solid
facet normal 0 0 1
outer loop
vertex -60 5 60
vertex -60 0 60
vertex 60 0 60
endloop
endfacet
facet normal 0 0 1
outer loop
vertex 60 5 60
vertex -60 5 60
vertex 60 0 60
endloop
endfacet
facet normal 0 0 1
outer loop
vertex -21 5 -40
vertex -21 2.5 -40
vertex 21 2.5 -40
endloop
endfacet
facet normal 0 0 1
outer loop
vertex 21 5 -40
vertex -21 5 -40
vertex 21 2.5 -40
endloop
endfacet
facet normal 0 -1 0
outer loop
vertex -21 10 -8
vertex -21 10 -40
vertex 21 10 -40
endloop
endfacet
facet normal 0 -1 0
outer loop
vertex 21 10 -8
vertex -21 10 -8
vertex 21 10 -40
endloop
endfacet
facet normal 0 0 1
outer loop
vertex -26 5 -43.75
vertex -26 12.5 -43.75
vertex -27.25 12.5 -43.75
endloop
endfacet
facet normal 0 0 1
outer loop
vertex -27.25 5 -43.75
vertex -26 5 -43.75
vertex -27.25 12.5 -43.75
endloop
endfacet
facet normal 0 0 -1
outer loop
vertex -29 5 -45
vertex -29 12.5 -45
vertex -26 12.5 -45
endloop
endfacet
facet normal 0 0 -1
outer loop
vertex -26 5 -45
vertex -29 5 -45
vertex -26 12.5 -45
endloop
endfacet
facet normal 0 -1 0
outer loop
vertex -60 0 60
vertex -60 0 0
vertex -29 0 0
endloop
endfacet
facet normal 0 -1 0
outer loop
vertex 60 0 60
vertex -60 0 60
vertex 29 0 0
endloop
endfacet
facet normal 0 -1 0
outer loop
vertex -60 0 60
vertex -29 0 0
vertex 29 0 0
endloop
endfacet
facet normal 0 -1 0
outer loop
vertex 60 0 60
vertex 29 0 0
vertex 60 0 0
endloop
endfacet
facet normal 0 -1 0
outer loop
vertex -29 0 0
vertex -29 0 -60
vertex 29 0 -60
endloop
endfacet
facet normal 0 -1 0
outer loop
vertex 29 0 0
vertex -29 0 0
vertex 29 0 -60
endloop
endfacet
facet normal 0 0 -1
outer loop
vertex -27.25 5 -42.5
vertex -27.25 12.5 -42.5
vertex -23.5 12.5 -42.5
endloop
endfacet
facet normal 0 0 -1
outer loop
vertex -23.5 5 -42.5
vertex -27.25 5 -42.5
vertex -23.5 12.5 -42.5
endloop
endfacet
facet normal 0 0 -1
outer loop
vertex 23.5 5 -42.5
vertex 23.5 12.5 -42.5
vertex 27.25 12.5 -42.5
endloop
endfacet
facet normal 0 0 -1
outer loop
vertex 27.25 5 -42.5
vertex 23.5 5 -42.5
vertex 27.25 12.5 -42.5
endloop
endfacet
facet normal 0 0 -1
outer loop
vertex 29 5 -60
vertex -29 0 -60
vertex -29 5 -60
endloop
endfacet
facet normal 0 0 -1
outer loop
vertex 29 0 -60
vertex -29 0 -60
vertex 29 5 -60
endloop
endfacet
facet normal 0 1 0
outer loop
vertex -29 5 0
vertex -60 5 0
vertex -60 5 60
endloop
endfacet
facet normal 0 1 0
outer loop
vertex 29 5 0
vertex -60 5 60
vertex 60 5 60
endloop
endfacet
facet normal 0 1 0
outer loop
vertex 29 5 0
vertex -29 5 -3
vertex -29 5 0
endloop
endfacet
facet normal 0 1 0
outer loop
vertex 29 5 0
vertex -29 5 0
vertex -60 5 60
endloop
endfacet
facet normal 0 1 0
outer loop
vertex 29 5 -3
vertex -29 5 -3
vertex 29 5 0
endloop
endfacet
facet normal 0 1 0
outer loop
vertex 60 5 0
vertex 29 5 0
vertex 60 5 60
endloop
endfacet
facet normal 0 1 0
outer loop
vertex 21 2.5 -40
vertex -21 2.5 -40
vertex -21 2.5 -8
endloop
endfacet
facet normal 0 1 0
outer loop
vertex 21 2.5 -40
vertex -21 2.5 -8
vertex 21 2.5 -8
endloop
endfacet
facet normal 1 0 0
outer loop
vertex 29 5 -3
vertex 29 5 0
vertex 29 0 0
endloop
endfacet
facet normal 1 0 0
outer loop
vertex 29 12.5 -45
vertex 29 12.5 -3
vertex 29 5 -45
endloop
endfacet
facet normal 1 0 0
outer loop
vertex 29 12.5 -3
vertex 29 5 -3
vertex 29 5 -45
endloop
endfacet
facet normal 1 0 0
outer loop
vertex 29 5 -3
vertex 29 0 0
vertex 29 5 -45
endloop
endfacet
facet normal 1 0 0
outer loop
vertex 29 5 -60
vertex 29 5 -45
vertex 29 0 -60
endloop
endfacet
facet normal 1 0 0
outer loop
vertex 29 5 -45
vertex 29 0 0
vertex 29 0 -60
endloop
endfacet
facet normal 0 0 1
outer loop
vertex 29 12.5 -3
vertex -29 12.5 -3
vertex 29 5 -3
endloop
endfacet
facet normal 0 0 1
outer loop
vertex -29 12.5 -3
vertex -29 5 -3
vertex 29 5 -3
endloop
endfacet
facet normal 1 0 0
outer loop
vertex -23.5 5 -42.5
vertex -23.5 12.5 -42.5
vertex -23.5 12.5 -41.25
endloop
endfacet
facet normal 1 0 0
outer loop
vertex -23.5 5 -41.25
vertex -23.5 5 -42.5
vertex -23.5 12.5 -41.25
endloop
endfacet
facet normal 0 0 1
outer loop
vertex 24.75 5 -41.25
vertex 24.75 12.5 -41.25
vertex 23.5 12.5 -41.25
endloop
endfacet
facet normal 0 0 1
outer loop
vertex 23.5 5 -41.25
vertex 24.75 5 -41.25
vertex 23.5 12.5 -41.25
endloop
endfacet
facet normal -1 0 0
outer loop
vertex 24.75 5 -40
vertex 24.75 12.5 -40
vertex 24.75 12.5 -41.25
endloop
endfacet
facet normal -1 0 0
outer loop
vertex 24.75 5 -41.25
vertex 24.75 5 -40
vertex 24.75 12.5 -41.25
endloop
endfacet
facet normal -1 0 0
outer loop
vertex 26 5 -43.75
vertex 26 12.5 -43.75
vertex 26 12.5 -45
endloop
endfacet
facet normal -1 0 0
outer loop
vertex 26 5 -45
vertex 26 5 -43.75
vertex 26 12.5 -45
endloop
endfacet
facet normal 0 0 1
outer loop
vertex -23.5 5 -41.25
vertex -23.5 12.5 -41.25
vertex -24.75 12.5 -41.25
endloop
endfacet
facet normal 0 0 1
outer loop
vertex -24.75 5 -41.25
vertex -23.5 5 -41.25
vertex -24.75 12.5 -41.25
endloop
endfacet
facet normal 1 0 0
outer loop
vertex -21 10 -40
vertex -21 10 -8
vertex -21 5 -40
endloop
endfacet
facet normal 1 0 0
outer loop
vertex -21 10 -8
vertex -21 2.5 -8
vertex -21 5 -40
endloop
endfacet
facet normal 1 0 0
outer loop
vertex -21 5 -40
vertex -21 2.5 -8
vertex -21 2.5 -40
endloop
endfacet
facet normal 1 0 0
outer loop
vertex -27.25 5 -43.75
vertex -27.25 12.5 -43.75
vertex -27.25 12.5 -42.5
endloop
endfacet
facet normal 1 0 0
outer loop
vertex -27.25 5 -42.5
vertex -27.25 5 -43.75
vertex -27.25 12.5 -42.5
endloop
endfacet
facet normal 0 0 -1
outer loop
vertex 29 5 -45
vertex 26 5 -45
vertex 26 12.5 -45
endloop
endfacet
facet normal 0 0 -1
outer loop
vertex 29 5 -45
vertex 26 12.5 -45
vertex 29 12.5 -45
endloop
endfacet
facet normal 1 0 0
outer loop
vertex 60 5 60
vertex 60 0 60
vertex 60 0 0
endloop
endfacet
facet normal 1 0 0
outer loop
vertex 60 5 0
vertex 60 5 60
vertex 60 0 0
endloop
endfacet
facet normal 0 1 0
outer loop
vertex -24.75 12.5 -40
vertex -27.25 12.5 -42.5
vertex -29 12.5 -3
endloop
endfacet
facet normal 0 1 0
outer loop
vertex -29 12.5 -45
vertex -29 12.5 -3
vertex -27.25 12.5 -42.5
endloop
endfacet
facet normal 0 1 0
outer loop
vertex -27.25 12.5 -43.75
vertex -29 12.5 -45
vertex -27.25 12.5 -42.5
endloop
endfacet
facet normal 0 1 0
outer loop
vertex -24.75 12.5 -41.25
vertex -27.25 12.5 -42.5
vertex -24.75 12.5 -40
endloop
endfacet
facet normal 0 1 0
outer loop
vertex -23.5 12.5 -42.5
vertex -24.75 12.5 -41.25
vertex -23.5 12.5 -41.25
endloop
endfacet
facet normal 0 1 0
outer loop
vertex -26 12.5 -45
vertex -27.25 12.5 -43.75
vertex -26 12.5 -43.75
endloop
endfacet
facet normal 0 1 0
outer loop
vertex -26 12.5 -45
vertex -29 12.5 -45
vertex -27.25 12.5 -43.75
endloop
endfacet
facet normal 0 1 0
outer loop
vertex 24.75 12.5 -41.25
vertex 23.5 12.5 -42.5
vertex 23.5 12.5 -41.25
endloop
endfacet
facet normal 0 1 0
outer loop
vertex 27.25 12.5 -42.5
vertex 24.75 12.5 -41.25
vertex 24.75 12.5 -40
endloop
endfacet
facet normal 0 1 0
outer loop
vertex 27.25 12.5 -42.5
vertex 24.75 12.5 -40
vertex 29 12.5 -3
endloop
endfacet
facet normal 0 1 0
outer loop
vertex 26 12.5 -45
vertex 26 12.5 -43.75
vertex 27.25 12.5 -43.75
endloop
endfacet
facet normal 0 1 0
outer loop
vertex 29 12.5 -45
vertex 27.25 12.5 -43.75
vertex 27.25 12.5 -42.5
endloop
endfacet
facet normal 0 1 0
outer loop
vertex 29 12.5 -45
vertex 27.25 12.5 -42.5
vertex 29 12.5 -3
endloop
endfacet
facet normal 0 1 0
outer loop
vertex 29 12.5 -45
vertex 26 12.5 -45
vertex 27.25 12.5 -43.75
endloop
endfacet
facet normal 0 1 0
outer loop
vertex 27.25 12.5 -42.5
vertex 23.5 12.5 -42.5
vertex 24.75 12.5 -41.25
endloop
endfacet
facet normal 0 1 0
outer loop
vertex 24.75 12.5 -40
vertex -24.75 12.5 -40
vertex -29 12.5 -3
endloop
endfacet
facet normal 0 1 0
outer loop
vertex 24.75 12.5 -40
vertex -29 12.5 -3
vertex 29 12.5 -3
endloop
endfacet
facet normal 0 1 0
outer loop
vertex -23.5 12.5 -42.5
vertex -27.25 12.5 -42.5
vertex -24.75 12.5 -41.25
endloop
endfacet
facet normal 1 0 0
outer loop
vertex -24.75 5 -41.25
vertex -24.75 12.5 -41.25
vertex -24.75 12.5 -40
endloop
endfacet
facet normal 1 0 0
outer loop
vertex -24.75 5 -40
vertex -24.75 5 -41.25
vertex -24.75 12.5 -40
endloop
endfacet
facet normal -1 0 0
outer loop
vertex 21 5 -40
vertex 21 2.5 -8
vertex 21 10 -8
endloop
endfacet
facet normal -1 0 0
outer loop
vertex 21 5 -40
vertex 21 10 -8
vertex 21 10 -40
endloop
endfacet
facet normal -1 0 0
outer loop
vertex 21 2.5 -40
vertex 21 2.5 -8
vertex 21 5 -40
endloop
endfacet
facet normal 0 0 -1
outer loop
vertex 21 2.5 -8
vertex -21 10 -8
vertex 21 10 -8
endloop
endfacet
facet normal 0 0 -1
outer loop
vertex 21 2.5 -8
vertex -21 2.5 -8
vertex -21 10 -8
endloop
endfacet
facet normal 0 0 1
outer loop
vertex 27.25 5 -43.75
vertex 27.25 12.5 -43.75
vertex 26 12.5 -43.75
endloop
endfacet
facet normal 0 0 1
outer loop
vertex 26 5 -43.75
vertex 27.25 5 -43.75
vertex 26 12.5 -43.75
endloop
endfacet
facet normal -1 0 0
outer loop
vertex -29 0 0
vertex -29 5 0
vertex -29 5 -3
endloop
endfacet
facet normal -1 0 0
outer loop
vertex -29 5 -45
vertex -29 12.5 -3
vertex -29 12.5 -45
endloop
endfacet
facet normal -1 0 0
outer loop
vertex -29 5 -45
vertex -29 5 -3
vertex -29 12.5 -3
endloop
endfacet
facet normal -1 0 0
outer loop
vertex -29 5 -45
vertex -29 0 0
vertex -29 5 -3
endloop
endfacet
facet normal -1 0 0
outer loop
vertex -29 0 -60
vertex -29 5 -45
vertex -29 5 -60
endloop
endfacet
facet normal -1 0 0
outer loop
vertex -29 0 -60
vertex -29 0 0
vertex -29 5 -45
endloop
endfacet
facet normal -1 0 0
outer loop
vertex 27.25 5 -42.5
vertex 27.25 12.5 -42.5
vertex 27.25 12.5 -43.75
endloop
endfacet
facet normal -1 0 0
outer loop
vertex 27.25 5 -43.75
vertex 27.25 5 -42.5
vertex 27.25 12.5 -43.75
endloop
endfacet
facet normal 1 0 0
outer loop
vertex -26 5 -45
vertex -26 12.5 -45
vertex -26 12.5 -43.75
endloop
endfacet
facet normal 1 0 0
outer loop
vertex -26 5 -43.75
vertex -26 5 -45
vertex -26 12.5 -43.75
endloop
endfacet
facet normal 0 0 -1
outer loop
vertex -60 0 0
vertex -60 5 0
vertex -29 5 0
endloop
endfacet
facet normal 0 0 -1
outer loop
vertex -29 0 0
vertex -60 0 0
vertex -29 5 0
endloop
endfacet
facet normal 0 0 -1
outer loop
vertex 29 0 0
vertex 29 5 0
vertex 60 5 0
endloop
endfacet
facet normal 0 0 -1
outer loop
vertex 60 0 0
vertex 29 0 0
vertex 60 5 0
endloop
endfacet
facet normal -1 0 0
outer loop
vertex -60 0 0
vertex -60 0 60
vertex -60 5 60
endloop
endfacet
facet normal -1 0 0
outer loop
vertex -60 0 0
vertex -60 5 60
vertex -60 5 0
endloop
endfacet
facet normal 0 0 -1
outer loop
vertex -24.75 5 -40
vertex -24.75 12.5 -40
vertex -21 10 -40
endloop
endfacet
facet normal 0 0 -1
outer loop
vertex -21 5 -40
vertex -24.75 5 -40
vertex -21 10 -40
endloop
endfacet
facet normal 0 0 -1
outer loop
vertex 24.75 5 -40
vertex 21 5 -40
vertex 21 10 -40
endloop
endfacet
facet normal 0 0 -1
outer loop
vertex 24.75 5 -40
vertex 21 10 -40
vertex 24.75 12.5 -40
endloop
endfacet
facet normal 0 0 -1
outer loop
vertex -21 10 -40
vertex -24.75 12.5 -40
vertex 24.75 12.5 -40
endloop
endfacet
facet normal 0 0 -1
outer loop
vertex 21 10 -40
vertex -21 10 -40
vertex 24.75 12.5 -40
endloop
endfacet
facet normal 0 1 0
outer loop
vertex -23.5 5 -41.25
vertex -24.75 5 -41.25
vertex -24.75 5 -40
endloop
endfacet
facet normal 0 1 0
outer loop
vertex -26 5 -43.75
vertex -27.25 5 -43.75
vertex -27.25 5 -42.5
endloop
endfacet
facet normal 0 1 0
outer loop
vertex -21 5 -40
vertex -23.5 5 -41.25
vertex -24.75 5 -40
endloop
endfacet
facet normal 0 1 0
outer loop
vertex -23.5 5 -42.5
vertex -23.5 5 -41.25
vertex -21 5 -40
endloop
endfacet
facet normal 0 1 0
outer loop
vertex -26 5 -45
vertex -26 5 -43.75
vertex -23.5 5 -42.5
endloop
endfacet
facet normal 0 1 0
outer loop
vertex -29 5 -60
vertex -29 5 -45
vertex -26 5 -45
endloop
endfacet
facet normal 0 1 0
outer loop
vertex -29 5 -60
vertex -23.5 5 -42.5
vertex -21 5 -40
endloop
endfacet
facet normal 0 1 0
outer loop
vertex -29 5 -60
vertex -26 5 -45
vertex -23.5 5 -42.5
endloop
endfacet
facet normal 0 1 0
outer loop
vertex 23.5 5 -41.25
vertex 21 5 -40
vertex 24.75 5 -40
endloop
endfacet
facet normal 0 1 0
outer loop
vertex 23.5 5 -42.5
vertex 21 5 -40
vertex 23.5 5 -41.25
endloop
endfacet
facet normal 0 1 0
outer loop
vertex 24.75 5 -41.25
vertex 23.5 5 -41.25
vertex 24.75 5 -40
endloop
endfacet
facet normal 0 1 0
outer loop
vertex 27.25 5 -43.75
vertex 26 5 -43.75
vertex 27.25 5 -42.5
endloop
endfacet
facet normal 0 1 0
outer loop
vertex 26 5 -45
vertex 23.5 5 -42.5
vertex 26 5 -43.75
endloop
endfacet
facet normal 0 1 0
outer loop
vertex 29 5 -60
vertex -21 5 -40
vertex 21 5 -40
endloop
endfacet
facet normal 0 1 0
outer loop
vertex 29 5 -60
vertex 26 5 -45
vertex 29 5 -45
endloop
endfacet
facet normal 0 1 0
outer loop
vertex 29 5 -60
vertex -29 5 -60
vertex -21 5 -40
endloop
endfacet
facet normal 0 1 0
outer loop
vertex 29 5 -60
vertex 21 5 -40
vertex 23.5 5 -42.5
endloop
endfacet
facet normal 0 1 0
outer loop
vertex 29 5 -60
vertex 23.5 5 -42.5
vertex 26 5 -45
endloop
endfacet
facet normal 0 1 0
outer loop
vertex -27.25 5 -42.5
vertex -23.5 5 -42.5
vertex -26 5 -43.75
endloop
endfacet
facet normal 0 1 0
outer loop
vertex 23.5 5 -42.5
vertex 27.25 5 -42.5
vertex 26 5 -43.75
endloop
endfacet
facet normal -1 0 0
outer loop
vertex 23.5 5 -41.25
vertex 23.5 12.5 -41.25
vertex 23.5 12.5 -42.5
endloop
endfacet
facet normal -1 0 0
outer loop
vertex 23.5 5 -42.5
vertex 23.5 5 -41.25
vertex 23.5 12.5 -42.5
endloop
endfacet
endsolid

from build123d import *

# Parameters (mm, degrees)
BASE_CROQUIS_W               = 120
BASE_CROQUIS_H               = 120
BASE_SALIENTE_DEPTH          = 5
ENCAJE_RUEDAS_CROQUIS_W      = 31
ENCAJE_RUEDAS_CROQUIS_H      = 60
ENCAJE_RUEDAS_CORTAR_DEPTH   = 5
CAJA_PLACAS_CROQUIS_1_W      = 58
CAJA_PLACAS_CROQUIS_1_H      = 42
CAJA_PLACAS_CROQUIS_1_W_2    = 42
CAJA_PLACAS_CROQUIS_1_H_2    = 32
CAJA_PLACAS_SALIENTE_1_DEPTH = 5
CAJA_PLACAS_CROQUIS_2_W      = 42
CAJA_PLACAS_CROQUIS_2_H      = 32
CAJA_PLACAS_CORTAR_2_DEPTH   = 2.5
CAJA_PLACAS_CROQUIS_3_W      = 58
CAJA_PLACAS_CROQUIS_3_H      = 42
CAJA_PLACAS_SALIENTE_3_DEPTH = 2.5
CAJA_PLACAS_CORTAR_4_DEPTH   = 7.5


with BuildPart() as part:
    # Base-Croquis → Base-Saliente (new body)
    with BuildSketch(Plane(origin=(0, 0, 0), x_dir=(1, 0, 0), z_dir=(0, 1, 0))):
        Rectangle(BASE_CROQUIS_W, BASE_CROQUIS_H)
    extrude(amount=BASE_SALIENTE_DEPTH)

    # Encaje-Ruedas-Croquis → Encaje-Ruedas-Cortar (cut)
    with BuildSketch(Plane(origin=(0, 5, 0), x_dir=(1, 0, 0), z_dir=(0, 1, 0))):
        with Locations((44.5, 30)):
            Rectangle(ENCAJE_RUEDAS_CROQUIS_W, ENCAJE_RUEDAS_CROQUIS_H)
        with Locations((-44.5, 30)):
            Rectangle(ENCAJE_RUEDAS_CROQUIS_W, ENCAJE_RUEDAS_CROQUIS_H)
    extrude(amount=-ENCAJE_RUEDAS_CORTAR_DEPTH, mode=Mode.SUBTRACT)

    # Caja-Placas-Croquis-1 → Caja-Placas-Saliente-1 (add)
    with BuildSketch(Plane(origin=(0, 5, 0), x_dir=(1, 0, 0), z_dir=(0, 1, 0))):
        with Locations((0, 24)):
            Rectangle(CAJA_PLACAS_CROQUIS_1_W, CAJA_PLACAS_CROQUIS_1_H)
        with Locations((0, 24)):
            Rectangle(CAJA_PLACAS_CROQUIS_1_W_2, CAJA_PLACAS_CROQUIS_1_H_2, mode=Mode.SUBTRACT)
    extrude(amount=CAJA_PLACAS_SALIENTE_1_DEPTH)

    # Caja-Placas-Croquis-2 → Caja-Placas-Cortar-2 (cut)
    with BuildSketch(Plane(origin=(0, 5, 0), x_dir=(1, 0, 0), z_dir=(0, 1, 0))):
        with Locations((0, 24)):
            Rectangle(CAJA_PLACAS_CROQUIS_2_W, CAJA_PLACAS_CROQUIS_2_H)
    extrude(amount=-CAJA_PLACAS_CORTAR_2_DEPTH, mode=Mode.SUBTRACT)

    # Caja-Placas-Croquis-3 → Caja-Placas-Saliente-3 (add)
    with BuildSketch(Plane(origin=(0, 10, 0), x_dir=(1, 0, 0), z_dir=(0, 1, 0))):
        with Locations((0, 24)):
            Rectangle(CAJA_PLACAS_CROQUIS_3_W, CAJA_PLACAS_CROQUIS_3_H)
    extrude(amount=CAJA_PLACAS_SALIENTE_3_DEPTH)

    # Caja-Placas-Croquis-4 → Caja-Placas-Cortar-4 (cut)
    with BuildSketch(Plane(origin=(0, 12.5, 0), x_dir=(1, 0, 0), z_dir=(0, 1, 0))):
        Polygon((23.5, 42.5), (26, 42.5), (27.25, 42.5), (27.25, 43.75), (26, 43.75), (26, 45), (-26, 45), (-26, 43.75), (-27.25, 43.75), (-27.25, 42.5), (-26, 42.5), (-23.5, 42.5), (-23.5, 41.25), (-24.75, 41.25), (-24.75, 40), (-23.5, 40), (23.5, 40), (24.75, 40), (24.75, 41.25), (23.5, 41.25), align=None)
    extrude(amount=-CAJA_PLACAS_CORTAR_4_DEPTH, mode=Mode.SUBTRACT)


solid = part.part
